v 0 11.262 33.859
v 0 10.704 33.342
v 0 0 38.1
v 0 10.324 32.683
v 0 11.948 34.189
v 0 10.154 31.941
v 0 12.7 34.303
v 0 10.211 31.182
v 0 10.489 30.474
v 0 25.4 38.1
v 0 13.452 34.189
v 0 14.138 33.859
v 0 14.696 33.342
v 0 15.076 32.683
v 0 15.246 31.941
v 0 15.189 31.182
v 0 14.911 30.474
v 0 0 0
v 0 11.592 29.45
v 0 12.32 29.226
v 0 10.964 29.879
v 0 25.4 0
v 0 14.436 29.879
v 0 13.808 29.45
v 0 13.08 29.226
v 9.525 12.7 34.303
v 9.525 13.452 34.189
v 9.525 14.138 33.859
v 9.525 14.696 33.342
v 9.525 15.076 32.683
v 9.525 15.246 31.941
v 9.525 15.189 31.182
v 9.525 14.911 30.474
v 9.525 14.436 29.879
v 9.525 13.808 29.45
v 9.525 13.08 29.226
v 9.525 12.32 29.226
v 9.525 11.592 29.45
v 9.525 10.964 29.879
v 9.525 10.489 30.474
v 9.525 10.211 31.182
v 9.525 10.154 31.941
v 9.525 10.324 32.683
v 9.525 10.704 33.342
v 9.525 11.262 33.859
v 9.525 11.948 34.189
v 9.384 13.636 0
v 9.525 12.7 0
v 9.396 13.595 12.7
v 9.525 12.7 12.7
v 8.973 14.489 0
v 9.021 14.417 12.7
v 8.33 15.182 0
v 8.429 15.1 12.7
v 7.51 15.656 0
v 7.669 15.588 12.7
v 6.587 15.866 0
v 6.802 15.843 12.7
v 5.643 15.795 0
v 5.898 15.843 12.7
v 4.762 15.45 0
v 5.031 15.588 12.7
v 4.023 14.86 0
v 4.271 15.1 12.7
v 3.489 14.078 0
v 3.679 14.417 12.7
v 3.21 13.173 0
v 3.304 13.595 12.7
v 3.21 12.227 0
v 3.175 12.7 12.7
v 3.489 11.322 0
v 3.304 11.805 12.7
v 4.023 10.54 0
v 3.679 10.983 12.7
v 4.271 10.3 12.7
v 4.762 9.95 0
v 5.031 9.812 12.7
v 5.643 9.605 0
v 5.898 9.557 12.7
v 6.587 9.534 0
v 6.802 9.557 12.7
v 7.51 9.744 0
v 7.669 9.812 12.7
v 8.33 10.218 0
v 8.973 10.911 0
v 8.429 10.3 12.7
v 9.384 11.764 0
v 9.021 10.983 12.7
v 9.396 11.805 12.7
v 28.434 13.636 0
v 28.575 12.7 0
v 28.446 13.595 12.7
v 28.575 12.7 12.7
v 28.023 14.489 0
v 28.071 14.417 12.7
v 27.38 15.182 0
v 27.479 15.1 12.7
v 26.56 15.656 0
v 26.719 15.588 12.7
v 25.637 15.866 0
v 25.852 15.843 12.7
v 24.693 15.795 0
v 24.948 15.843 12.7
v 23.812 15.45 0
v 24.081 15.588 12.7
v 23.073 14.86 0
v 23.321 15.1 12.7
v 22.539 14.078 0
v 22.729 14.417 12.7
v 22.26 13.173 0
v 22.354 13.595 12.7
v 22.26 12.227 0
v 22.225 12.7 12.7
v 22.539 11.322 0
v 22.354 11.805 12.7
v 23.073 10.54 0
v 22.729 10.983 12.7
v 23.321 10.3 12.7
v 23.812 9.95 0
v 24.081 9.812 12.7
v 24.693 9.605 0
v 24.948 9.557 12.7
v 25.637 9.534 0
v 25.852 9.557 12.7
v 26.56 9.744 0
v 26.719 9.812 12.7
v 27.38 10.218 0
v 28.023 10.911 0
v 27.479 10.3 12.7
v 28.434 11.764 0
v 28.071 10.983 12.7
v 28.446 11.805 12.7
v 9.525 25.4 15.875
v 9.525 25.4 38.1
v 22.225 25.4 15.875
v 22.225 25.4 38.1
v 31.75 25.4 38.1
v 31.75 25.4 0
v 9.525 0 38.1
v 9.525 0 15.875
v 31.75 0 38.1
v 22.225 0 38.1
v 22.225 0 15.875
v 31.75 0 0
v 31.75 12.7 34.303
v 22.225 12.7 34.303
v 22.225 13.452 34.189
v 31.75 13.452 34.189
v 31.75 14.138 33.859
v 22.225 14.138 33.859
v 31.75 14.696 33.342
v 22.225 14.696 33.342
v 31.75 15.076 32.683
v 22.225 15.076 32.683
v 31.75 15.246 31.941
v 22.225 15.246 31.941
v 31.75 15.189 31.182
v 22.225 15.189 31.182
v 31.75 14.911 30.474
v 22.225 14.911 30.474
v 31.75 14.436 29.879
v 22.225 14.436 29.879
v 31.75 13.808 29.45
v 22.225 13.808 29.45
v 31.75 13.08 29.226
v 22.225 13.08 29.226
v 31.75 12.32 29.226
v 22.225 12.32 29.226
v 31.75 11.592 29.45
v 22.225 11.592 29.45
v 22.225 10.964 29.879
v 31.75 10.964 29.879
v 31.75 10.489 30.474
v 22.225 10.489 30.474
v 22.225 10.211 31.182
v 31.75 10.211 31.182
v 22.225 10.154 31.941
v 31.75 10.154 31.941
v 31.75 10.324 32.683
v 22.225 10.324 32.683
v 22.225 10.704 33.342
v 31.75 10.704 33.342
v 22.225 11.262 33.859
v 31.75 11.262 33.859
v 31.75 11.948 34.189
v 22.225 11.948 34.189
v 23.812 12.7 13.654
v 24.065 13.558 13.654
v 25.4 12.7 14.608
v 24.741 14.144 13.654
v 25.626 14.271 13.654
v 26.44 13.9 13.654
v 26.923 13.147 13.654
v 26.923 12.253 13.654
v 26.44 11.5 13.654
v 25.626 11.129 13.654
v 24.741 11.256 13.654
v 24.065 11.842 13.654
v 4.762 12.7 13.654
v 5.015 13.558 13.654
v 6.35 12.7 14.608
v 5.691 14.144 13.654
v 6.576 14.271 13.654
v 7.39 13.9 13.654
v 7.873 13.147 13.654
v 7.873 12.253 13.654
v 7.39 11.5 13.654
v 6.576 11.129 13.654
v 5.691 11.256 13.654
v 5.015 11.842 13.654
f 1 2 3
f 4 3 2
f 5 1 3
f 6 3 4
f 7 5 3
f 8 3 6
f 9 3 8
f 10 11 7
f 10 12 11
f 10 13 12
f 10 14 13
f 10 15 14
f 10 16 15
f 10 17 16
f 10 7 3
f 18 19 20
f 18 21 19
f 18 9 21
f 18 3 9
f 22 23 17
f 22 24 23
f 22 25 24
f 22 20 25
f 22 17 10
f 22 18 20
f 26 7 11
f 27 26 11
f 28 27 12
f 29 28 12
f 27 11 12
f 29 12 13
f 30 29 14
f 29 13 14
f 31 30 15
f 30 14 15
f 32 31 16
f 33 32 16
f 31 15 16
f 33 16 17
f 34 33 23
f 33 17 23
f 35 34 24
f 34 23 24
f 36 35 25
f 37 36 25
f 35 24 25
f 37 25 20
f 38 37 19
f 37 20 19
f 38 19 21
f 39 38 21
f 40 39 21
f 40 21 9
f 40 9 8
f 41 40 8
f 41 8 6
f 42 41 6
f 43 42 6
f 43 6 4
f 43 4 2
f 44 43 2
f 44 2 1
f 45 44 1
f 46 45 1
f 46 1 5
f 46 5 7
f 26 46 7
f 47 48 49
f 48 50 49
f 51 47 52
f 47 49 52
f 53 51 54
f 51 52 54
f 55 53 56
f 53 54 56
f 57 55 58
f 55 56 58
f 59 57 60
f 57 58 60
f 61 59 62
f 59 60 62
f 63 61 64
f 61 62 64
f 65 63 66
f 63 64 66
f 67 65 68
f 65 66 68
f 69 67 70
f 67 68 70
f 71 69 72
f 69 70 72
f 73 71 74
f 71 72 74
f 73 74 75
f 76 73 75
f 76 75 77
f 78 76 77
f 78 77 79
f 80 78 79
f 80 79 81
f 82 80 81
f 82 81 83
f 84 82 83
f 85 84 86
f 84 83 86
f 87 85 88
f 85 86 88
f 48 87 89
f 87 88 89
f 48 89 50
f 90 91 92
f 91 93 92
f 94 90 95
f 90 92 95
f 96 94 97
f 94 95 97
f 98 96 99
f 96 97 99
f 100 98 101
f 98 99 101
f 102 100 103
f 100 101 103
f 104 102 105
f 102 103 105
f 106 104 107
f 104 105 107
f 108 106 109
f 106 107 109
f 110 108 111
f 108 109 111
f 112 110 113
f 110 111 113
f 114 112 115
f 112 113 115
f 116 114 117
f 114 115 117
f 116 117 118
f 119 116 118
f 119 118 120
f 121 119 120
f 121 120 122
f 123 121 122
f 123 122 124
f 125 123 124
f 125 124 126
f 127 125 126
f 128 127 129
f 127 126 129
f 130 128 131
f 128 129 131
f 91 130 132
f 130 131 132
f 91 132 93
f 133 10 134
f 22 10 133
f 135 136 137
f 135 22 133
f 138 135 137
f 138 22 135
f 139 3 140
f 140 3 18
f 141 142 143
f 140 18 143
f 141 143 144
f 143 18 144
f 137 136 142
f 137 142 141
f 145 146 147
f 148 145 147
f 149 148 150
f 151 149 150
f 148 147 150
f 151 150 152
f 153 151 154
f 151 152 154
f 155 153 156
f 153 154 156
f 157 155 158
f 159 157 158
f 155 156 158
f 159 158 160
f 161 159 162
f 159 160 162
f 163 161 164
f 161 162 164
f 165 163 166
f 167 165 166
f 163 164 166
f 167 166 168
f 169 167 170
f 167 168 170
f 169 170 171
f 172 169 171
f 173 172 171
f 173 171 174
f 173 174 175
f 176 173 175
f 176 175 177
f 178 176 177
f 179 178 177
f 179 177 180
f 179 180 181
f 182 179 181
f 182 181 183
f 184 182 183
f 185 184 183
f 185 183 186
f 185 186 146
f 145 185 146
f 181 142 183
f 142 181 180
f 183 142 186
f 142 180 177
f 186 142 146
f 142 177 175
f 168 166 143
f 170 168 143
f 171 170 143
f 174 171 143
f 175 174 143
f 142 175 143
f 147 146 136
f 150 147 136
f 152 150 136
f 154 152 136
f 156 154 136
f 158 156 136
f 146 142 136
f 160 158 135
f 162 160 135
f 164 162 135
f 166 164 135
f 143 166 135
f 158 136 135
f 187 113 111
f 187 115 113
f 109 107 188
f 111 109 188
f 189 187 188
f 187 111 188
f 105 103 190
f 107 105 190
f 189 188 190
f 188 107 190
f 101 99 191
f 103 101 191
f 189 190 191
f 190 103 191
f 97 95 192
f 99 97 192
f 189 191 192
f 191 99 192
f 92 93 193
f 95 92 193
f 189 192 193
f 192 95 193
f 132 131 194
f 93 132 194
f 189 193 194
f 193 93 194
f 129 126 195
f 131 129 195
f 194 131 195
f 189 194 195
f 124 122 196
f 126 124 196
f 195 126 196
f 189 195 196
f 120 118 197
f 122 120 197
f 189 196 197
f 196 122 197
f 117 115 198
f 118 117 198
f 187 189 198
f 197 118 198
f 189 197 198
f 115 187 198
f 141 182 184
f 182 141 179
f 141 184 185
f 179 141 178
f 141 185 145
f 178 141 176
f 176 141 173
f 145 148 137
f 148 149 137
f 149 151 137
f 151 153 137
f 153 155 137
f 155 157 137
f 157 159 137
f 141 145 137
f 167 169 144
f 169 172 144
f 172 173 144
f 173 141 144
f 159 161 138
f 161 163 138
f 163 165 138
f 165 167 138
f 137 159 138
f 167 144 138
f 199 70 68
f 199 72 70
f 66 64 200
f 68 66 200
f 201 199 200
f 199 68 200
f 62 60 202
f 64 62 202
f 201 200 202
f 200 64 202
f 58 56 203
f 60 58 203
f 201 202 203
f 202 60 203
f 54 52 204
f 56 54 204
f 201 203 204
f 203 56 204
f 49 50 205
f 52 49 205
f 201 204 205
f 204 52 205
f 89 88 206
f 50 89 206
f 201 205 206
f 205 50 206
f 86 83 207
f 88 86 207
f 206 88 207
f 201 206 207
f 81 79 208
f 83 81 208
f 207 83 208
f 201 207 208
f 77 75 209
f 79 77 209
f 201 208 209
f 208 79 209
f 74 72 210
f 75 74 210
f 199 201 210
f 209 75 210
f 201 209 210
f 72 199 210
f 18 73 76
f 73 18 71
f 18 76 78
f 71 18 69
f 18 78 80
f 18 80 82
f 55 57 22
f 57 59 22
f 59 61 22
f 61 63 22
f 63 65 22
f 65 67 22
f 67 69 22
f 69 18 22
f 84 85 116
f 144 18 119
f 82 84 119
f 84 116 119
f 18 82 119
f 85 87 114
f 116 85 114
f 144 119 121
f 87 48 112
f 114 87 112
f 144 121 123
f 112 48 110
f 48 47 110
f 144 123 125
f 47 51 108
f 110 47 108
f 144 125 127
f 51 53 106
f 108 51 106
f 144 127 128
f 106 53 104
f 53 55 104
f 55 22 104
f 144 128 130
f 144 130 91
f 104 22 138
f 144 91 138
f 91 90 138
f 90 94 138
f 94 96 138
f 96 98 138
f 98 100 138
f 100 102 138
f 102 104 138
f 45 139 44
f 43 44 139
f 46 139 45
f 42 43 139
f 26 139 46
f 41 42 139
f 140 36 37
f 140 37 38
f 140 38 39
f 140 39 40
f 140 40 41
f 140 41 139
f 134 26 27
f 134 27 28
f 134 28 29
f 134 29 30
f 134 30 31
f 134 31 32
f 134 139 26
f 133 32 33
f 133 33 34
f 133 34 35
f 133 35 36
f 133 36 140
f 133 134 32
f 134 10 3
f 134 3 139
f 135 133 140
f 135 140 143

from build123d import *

# Parameters (mm, degrees)
SKETCH1_W                       = 31.75
SKETCH1_H                       = 25.4
BOSS_EXTRUDE1_DEPTH             = 38.1
F_1_4_0_25_DIAMETER_HOLE1_D     = 6.35
F_1_4_0_25_DIAMETER_HOLE1_DEPTH = 12.7
F_1_4_0_25_DIAMETER_HOLE1_TIP   = 1.907732465
SKETCH5_W                       = 12.7
SKETCH5_H                       = 22.225
CUT_EXTRUDE2_DEPTH              = 26.4
F_10_CLEARANCE_HOLE1_D          = 5.1054


with BuildPart() as part:
    # Sketch1 → Boss-Extrude1 (new body)
    with BuildSketch(Plane.XY):
        with Locations((15.875, 12.7)):
            Rectangle(SKETCH1_W, SKETCH1_H)
    extrude(amount=BOSS_EXTRUDE1_DEPTH)

    # 1/4 (0.25) Diameter Hole1
    with Locations(Plane(origin=(0, 0, 0), x_dir=(-1, 0, 0), z_dir=(0, 0, -1))):
        with Locations((-25.4, 12.7), (-6.35, 12.7)):
            Hole(F_1_4_0_25_DIAMETER_HOLE1_D / 2, depth=F_1_4_0_25_DIAMETER_HOLE1_DEPTH)
            with Locations((0, 0, -(F_1_4_0_25_DIAMETER_HOLE1_DEPTH + F_1_4_0_25_DIAMETER_HOLE1_TIP / 2))):  # 118° drill point
                Cone(0, F_1_4_0_25_DIAMETER_HOLE1_D / 2, F_1_4_0_25_DIAMETER_HOLE1_TIP, mode=Mode.SUBTRACT)

    # Sketch5 → Cut-Extrude2 (cut, through all)
    with BuildSketch(Plane(origin=(0, 25.4, 0), x_dir=(1, 0, 0), z_dir=(0, 1, 0))):
        with Locations((15.875, -26.9875)):
            Rectangle(SKETCH5_W, SKETCH5_H)
    extrude(amount=-CUT_EXTRUDE2_DEPTH, mode=Mode.SUBTRACT)

    # #10 Clearance Hole1 (through all)
    with Locations(Plane(origin=(31.75, 0, 0), x_dir=(0, 0, -1), z_dir=(1, 0, 0))):
        with Locations((-31.75, 12.7)):
            Hole(F_10_CLEARANCE_HOLE1_D / 2)


solid = part.part
